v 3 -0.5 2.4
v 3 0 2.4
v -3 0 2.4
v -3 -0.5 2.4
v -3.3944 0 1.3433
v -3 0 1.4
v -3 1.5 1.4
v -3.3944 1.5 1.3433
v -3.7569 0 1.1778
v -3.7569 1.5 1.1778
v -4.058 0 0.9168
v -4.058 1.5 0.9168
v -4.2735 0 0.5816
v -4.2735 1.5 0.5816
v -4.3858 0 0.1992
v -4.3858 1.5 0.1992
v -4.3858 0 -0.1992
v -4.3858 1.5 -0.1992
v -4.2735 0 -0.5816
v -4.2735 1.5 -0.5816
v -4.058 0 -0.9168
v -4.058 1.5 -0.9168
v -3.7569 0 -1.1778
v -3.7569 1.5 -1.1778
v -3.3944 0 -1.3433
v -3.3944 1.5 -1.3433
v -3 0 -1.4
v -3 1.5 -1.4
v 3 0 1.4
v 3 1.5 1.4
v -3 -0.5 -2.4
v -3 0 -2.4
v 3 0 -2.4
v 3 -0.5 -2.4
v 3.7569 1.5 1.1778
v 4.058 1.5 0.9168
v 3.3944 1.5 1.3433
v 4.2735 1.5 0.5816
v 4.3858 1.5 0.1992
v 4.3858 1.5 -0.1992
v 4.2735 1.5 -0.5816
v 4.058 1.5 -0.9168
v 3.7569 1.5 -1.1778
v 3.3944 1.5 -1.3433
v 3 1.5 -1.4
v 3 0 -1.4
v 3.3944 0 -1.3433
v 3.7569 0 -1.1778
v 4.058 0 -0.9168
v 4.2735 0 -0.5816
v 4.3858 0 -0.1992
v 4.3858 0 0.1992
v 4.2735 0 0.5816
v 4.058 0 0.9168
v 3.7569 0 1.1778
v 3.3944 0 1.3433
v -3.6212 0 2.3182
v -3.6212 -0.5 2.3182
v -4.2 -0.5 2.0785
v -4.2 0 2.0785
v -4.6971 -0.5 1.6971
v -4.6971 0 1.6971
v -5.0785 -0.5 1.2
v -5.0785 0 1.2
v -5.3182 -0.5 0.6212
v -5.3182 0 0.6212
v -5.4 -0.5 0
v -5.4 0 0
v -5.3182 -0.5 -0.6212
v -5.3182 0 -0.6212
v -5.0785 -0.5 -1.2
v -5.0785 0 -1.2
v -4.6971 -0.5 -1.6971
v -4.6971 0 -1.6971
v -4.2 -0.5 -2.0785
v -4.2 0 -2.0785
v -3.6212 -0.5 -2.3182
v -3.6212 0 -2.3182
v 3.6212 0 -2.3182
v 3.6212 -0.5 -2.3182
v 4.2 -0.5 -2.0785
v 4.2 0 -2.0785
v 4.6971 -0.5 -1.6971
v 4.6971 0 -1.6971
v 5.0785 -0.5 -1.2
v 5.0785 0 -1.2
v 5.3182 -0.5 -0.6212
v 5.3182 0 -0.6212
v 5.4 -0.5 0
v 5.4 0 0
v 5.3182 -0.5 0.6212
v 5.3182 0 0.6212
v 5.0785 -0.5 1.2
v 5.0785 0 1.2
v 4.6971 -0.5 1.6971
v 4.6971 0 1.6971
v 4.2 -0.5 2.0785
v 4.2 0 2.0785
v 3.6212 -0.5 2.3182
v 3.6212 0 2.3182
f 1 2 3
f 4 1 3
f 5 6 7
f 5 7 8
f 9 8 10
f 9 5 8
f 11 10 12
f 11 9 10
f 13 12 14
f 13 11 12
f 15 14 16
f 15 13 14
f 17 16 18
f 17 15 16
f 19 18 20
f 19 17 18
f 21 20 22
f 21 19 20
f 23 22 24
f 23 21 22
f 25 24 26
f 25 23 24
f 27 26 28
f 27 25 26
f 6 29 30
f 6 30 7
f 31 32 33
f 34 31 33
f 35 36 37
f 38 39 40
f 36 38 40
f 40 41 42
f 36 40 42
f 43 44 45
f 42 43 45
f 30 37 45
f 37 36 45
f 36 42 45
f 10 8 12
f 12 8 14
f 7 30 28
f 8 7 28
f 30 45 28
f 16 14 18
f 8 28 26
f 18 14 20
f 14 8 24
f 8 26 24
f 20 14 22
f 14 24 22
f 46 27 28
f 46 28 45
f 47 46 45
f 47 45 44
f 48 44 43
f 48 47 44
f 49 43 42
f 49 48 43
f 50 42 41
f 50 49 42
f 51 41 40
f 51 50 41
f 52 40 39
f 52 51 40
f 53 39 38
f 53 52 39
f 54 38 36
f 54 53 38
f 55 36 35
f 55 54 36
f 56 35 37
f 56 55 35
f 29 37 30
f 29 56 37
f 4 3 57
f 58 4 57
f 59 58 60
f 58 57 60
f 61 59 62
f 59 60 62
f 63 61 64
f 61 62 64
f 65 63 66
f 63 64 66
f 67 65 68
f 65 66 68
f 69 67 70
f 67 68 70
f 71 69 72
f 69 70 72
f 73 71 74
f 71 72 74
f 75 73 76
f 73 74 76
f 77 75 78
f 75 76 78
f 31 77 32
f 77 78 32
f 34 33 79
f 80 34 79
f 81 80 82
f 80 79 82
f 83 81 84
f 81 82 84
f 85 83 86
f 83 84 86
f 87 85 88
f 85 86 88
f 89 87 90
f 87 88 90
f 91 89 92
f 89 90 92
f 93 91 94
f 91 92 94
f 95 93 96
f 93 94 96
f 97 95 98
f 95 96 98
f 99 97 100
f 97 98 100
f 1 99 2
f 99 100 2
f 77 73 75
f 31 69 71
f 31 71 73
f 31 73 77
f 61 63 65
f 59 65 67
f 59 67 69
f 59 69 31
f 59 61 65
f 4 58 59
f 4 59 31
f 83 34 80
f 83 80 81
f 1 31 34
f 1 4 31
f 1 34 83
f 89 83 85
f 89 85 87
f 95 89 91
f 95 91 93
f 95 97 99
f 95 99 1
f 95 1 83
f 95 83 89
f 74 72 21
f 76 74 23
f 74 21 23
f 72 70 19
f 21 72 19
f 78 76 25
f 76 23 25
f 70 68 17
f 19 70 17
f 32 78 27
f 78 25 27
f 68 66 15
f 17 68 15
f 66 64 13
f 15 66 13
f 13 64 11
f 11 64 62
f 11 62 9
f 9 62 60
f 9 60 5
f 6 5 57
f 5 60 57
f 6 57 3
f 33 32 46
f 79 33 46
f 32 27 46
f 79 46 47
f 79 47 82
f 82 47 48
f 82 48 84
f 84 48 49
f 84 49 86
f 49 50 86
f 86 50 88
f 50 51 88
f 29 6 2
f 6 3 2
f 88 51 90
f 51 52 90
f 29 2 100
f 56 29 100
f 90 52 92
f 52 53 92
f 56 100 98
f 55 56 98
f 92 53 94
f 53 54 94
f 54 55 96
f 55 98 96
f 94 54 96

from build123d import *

# Parameters (mm, degrees)
EXTRUDE_1_DEPTH = 1.5
EXTRUDE_2_DEPTH = 0.5


with BuildPart() as part:
    # 草图1 → 凸台-拉伸1 (new body)
    with BuildSketch(Plane(origin=(0, 0, 0), x_dir=(1, 0, 0), z_dir=(0, 1, 0))):
        with BuildLine():
            Line((-3, 1.4), (3, 1.4))
            ThreePointArc((3, 1.4), (4.4, 0), (3, -1.4))
            Line((3, -1.4), (-3, -1.4))
            ThreePointArc((-3, -1.4), (-4.4, 0), (-3, 1.4))
        make_face()
    extrude(amount=EXTRUDE_1_DEPTH)

    # 草图2 → 凸台-拉伸2 (add)
    with BuildSketch(Plane.XZ):
        with BuildLine():
            Line((-3, -2.4), (3, -2.4))
            ThreePointArc((3, -2.4), (5.4, 0), (3, 2.4))
            Line((3, 2.4), (-3, 2.4))
            ThreePointArc((-3, 2.4), (-5.4, 0), (-3, -2.4))
        make_face()
    extrude(amount=EXTRUDE_2_DEPTH)


solid = part.part
